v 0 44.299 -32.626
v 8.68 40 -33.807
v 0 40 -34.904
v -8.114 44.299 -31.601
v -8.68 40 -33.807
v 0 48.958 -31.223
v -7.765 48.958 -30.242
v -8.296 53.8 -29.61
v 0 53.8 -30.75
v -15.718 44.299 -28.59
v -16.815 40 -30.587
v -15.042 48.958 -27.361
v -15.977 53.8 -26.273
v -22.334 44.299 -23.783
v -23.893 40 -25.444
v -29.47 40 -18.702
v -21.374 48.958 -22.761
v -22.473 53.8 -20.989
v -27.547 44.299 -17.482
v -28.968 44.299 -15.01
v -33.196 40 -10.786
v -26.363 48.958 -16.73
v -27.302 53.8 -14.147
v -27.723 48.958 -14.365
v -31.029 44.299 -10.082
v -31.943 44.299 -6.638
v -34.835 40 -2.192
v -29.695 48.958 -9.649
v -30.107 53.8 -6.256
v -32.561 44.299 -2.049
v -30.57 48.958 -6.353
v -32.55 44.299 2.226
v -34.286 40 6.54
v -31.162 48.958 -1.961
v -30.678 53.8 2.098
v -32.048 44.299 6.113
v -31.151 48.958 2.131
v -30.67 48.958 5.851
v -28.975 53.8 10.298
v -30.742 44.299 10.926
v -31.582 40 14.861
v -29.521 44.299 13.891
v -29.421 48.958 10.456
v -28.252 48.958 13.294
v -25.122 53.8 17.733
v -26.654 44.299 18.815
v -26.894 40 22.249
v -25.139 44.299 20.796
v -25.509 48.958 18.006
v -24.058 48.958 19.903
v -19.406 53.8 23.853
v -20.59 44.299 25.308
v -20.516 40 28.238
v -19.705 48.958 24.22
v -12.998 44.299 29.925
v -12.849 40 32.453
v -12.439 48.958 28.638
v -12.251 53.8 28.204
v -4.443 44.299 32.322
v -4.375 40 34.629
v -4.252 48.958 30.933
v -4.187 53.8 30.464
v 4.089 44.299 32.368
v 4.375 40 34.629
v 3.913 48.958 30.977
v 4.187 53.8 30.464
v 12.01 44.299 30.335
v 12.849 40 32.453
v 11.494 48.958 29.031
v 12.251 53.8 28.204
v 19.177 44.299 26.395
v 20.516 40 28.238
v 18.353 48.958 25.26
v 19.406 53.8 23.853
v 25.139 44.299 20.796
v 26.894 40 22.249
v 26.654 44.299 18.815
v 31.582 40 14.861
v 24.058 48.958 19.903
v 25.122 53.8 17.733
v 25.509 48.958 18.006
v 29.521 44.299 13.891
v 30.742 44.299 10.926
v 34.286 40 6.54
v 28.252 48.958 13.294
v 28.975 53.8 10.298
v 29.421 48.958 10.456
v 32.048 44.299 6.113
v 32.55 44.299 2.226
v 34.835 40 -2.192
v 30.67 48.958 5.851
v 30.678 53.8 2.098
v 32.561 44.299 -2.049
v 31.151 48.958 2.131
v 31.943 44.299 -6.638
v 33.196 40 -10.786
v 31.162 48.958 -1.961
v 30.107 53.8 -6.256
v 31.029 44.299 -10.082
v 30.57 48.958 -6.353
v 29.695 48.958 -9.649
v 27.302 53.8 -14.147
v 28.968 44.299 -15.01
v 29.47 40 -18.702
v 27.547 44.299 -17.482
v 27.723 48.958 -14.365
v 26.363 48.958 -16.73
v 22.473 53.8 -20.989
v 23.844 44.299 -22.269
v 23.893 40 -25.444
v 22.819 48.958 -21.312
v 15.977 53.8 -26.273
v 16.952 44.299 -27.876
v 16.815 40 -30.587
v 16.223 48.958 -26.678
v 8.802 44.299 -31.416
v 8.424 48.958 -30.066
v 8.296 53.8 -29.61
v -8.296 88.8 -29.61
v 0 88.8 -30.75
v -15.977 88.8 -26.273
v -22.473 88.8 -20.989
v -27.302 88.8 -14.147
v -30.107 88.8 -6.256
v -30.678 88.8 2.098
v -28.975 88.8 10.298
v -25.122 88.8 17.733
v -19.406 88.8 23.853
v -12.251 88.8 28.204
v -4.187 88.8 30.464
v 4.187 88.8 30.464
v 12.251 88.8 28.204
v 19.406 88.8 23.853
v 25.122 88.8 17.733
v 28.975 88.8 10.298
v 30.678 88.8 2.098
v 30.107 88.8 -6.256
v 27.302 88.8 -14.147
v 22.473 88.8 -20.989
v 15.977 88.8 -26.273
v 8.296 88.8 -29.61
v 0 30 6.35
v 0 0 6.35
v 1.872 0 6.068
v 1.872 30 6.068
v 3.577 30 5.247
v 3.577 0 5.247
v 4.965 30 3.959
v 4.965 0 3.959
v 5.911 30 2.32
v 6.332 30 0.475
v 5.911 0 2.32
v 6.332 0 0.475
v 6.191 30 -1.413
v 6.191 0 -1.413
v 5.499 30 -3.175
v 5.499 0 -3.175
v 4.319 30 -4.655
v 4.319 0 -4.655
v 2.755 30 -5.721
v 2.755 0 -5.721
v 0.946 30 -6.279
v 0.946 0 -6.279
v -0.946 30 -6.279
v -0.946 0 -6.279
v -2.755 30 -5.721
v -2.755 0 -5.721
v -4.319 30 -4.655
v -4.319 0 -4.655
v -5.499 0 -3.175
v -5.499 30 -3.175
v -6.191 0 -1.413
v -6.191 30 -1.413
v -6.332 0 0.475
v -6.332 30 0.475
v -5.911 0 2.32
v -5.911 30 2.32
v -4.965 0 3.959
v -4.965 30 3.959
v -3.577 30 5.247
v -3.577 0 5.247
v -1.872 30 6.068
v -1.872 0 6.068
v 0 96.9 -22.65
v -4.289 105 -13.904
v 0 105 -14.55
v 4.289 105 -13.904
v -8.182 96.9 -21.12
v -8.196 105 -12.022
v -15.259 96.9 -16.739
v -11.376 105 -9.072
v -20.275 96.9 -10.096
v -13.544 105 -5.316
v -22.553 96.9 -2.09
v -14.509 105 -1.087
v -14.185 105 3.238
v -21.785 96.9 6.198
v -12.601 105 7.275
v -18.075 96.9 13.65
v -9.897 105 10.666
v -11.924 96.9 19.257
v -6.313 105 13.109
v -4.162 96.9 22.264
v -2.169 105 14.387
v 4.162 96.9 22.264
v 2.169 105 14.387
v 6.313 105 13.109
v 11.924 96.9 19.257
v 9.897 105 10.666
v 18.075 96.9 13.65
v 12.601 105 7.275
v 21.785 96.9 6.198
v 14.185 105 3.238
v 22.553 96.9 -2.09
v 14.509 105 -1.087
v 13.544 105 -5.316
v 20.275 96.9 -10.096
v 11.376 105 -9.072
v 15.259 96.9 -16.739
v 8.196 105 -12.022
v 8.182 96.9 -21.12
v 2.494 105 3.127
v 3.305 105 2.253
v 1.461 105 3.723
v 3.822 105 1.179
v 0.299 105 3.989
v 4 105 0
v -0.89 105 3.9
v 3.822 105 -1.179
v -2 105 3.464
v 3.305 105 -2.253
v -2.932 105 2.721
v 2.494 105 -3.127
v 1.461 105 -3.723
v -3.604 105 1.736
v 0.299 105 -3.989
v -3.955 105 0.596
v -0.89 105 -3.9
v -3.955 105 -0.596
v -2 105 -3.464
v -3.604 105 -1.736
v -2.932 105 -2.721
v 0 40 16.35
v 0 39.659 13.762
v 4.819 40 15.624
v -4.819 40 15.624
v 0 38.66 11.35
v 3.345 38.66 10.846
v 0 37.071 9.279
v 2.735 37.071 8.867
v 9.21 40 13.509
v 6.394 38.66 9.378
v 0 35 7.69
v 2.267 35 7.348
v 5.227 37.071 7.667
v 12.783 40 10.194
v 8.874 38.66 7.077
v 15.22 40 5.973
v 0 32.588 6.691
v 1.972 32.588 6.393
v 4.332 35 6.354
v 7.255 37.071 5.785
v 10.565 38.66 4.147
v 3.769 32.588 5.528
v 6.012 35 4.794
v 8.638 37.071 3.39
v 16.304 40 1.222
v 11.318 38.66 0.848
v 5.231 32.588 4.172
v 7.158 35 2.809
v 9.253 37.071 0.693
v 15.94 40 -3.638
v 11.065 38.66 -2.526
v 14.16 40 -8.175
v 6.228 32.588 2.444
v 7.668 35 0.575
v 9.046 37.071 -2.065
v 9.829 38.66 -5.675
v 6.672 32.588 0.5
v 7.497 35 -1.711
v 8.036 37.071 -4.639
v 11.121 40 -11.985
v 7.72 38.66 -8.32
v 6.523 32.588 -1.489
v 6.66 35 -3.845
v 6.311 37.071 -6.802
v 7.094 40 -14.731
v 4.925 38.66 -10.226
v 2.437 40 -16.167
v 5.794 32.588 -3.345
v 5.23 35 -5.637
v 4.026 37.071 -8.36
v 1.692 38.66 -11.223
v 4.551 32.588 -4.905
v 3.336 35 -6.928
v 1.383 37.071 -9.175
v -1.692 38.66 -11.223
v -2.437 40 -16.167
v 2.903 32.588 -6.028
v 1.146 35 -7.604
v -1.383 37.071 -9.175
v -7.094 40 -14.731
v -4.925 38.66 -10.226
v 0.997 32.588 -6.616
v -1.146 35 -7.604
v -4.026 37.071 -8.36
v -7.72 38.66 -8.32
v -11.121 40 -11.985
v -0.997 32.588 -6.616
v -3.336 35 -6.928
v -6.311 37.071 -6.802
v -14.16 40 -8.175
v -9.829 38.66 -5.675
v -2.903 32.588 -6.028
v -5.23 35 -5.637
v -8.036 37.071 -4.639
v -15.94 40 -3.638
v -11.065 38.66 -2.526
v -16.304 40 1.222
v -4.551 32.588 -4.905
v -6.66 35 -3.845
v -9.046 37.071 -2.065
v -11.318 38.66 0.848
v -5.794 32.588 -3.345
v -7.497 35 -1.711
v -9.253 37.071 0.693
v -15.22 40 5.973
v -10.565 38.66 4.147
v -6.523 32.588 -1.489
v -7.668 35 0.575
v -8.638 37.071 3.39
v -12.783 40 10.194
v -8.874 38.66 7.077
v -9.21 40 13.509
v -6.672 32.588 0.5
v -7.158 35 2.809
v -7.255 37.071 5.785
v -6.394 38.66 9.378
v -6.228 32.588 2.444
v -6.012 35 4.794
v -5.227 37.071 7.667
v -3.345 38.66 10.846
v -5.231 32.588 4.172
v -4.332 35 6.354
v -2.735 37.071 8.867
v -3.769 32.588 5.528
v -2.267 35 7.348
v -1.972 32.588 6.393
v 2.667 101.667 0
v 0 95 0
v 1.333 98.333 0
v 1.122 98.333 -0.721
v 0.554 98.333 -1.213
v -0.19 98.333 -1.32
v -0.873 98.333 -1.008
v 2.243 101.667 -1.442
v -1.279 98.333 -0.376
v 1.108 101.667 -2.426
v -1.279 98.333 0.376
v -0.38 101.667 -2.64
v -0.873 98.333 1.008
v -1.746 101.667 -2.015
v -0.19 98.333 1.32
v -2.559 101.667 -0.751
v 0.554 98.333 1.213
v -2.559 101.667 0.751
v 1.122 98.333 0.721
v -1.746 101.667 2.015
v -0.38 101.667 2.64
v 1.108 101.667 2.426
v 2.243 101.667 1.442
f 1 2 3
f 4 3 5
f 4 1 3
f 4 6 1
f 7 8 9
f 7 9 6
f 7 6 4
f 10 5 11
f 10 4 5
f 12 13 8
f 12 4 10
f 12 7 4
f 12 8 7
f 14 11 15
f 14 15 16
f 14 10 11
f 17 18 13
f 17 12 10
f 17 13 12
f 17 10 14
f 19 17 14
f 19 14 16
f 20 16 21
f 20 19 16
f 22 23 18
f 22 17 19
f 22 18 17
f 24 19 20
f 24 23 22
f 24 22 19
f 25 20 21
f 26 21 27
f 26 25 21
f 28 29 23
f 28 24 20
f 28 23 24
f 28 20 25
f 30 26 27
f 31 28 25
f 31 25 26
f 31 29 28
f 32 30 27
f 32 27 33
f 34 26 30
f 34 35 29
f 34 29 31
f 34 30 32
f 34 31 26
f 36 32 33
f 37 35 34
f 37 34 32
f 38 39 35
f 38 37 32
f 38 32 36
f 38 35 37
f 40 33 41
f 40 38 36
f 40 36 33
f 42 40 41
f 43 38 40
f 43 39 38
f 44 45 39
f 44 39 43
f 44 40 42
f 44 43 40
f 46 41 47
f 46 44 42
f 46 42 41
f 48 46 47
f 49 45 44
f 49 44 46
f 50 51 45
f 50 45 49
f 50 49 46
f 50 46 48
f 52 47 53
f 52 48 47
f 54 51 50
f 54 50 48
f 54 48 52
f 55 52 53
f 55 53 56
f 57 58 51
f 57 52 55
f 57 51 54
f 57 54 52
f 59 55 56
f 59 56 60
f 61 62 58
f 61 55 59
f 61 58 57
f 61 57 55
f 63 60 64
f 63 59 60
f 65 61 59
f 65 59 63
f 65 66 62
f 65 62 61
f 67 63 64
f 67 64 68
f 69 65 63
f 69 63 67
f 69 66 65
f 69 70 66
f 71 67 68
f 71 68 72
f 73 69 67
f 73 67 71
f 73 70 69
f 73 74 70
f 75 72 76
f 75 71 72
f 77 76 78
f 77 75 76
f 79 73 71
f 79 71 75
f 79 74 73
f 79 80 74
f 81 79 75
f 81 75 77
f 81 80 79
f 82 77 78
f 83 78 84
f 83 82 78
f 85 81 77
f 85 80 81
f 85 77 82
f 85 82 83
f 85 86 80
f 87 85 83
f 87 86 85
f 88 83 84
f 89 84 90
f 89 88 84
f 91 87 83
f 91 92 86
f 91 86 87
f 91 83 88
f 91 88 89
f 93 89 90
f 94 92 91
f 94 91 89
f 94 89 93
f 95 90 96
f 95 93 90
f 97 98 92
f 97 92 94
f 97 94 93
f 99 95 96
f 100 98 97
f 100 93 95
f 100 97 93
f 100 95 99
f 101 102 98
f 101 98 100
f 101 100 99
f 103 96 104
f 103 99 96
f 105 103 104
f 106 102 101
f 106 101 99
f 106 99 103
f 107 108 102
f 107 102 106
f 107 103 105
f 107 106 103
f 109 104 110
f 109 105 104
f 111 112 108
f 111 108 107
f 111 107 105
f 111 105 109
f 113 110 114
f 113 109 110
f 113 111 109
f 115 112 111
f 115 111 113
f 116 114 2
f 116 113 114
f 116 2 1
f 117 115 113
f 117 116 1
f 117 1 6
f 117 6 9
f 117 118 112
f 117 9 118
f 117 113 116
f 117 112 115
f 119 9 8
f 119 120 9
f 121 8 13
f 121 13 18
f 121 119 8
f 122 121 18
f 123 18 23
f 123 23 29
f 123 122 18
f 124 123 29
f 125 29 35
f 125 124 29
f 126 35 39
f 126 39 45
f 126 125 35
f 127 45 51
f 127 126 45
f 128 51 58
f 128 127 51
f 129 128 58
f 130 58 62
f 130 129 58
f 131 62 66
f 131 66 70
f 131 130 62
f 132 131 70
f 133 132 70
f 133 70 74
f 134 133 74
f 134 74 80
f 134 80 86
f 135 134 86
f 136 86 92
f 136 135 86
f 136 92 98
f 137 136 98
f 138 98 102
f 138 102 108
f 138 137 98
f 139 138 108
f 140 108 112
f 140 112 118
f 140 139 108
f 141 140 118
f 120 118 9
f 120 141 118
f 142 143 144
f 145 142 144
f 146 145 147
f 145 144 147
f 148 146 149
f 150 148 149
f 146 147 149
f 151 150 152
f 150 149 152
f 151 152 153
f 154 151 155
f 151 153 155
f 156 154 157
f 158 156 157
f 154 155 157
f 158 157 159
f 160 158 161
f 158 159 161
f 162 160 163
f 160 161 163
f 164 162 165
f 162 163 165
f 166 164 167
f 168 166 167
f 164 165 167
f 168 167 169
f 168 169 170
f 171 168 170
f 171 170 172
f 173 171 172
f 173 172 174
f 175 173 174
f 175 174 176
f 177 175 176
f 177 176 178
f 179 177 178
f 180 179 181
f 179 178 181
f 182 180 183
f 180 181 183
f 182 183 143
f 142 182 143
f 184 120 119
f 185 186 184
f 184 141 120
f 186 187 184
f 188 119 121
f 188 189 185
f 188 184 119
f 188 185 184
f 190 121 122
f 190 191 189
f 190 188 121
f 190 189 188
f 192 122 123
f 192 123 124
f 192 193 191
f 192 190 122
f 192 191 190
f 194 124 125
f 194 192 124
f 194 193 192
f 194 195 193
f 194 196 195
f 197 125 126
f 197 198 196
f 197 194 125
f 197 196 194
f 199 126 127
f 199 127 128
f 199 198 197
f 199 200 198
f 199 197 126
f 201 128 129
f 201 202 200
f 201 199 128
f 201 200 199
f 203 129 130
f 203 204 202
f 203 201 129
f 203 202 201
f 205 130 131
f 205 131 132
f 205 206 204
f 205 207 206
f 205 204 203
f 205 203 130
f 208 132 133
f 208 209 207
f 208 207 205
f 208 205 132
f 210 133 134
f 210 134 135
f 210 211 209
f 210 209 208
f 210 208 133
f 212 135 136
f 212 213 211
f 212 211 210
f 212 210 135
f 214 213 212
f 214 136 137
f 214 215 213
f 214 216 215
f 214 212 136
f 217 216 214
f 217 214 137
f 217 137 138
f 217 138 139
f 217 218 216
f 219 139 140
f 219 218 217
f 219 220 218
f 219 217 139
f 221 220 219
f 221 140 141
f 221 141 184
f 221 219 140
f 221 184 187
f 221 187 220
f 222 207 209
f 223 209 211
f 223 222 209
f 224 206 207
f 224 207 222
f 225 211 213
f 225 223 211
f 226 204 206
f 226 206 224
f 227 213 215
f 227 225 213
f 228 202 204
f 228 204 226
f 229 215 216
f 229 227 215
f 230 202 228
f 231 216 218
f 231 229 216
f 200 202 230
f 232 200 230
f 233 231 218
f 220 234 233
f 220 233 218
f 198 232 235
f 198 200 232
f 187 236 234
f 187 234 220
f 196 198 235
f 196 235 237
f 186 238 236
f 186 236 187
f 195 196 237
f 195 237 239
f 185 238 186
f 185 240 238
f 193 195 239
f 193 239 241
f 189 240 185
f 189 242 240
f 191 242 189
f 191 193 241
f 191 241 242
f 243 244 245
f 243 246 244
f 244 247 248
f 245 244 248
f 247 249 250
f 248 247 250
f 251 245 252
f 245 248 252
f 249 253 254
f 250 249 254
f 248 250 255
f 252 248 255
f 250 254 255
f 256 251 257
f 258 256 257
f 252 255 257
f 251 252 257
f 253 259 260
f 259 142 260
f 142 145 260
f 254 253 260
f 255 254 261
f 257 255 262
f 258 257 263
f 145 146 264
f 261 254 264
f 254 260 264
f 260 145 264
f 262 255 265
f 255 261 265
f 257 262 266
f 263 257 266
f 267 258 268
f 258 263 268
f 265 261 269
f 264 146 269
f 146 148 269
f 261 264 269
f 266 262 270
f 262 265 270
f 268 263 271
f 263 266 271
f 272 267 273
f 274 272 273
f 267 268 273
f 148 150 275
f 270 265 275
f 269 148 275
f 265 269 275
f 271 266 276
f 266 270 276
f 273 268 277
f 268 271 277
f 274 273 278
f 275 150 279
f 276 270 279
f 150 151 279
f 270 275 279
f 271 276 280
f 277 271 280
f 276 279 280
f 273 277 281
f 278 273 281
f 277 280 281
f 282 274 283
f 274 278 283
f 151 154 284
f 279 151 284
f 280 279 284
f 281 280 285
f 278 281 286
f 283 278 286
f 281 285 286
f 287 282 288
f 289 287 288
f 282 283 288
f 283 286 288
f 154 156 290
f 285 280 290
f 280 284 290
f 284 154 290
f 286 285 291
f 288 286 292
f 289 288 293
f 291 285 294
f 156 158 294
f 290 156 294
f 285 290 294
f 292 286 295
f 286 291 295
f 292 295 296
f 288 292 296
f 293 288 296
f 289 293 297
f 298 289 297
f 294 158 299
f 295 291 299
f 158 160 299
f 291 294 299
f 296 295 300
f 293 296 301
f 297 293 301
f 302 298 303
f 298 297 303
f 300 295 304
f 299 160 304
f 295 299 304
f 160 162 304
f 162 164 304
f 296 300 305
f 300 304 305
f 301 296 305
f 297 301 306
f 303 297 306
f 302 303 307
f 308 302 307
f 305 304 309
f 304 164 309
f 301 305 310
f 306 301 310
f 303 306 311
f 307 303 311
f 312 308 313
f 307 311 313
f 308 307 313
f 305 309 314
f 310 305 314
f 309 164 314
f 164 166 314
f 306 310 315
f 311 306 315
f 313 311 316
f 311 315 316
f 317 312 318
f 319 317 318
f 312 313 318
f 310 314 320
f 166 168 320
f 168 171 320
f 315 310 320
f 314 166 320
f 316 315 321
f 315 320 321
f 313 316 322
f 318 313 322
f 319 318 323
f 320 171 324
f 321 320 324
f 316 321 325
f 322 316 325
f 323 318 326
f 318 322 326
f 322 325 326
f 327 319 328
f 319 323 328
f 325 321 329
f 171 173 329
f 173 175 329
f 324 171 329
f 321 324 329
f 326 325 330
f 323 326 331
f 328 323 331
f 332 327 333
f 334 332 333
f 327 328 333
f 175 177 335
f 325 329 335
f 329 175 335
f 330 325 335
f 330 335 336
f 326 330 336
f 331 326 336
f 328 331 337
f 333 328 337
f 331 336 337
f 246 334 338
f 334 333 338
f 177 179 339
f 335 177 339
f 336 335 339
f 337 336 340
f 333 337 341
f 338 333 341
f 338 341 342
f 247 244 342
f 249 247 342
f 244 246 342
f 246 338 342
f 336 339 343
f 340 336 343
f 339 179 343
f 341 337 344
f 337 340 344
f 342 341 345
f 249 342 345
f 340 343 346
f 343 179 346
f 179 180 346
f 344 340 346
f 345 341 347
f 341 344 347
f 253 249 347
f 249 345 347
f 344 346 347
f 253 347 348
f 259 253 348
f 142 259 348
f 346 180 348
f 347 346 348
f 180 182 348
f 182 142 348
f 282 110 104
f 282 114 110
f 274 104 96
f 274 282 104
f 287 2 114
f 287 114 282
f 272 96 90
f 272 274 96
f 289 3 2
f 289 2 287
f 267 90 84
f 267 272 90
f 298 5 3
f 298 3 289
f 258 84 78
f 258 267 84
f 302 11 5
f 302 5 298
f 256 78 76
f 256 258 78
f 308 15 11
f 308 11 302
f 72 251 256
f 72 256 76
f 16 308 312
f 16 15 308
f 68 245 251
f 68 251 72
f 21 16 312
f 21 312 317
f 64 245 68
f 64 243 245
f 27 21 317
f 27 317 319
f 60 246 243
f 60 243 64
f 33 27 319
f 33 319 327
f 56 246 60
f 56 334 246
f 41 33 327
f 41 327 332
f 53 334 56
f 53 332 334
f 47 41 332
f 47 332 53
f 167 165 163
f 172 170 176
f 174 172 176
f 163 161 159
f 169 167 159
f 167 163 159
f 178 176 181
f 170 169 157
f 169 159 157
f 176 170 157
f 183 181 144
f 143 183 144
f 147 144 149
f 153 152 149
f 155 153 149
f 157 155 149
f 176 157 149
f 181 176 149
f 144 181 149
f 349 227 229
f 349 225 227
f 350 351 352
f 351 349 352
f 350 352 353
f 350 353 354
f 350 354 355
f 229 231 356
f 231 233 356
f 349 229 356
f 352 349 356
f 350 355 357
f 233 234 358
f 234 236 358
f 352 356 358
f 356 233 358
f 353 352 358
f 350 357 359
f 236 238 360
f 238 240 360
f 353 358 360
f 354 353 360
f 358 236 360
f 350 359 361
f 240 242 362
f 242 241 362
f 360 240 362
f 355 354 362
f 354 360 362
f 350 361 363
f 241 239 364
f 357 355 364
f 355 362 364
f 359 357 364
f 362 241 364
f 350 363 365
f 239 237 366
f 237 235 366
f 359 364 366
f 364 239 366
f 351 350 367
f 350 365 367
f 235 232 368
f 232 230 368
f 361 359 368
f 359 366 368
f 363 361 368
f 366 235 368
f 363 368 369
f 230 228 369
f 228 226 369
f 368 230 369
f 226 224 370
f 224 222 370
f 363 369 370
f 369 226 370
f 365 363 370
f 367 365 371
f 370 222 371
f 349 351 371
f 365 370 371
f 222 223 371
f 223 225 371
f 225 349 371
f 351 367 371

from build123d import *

# Parameters (mm, degrees)
SKETCH2_R           = 6.35
BOSS_EXTRUDE1_DEPTH = 40
FILLET1_R           = 10
SKETCH5_R           = 4


with BuildPart() as part:
    # Sketch2 → Boss-Extrude1 (new body)
    with BuildSketch(Plane(origin=(0, 0, 0), x_dir=(1, 0, 0), z_dir=(0, 1, 0))):
        with Locations(Location((0, 0, 0), (0, 0, 270))):
            Circle(SKETCH2_R)
    extrude(amount=BOSS_EXTRUDE1_DEPTH)

    # Sketch4 → Revolve1 (revolve)
    with BuildSketch(Plane.XY, mode=Mode.PRIVATE) as revolve1_sk:
        with BuildLine():
            Line((0, 40), (34.903897247, 40))
            ThreePointArc((34.903897247, 40), (31.810988232, 46.594188763), (30.75, 53.8))
            Line((30.75, 53.8), (30.75, 88.8))
            Line((30.75, 88.8), (14.55, 105))
            Line((14.55, 105), (0, 105))
            Line((0, 105), (0, 40))
        make_face()
    revolve(revolve1_sk.sketch.rotate(Axis((0, 40, 0), (0, 1, 0)), 90), axis=Axis((0, 40, 0), (0, 1, 0)))

    # Fillet1
    fillet1_edges = [part.edges().sort_by_distance(p)[0] for p in [
        (0, 40, -6.35),
    ]]
    fillet(fillet1_edges, radius=FILLET1_R)

    # Sketch5 → Cut-Loft1 section 0
    with BuildSketch(Plane(origin=(0, 105, 0), x_dir=(1, 0, 0), z_dir=(0, 1, 0)), mode=Mode.PRIVATE) as cut_loft1_s0:
        Circle(SKETCH5_R)
    loft([Vertex(0, 95, 0), cut_loft1_s0.sketch], mode=Mode.SUBTRACT)


solid = part.part
